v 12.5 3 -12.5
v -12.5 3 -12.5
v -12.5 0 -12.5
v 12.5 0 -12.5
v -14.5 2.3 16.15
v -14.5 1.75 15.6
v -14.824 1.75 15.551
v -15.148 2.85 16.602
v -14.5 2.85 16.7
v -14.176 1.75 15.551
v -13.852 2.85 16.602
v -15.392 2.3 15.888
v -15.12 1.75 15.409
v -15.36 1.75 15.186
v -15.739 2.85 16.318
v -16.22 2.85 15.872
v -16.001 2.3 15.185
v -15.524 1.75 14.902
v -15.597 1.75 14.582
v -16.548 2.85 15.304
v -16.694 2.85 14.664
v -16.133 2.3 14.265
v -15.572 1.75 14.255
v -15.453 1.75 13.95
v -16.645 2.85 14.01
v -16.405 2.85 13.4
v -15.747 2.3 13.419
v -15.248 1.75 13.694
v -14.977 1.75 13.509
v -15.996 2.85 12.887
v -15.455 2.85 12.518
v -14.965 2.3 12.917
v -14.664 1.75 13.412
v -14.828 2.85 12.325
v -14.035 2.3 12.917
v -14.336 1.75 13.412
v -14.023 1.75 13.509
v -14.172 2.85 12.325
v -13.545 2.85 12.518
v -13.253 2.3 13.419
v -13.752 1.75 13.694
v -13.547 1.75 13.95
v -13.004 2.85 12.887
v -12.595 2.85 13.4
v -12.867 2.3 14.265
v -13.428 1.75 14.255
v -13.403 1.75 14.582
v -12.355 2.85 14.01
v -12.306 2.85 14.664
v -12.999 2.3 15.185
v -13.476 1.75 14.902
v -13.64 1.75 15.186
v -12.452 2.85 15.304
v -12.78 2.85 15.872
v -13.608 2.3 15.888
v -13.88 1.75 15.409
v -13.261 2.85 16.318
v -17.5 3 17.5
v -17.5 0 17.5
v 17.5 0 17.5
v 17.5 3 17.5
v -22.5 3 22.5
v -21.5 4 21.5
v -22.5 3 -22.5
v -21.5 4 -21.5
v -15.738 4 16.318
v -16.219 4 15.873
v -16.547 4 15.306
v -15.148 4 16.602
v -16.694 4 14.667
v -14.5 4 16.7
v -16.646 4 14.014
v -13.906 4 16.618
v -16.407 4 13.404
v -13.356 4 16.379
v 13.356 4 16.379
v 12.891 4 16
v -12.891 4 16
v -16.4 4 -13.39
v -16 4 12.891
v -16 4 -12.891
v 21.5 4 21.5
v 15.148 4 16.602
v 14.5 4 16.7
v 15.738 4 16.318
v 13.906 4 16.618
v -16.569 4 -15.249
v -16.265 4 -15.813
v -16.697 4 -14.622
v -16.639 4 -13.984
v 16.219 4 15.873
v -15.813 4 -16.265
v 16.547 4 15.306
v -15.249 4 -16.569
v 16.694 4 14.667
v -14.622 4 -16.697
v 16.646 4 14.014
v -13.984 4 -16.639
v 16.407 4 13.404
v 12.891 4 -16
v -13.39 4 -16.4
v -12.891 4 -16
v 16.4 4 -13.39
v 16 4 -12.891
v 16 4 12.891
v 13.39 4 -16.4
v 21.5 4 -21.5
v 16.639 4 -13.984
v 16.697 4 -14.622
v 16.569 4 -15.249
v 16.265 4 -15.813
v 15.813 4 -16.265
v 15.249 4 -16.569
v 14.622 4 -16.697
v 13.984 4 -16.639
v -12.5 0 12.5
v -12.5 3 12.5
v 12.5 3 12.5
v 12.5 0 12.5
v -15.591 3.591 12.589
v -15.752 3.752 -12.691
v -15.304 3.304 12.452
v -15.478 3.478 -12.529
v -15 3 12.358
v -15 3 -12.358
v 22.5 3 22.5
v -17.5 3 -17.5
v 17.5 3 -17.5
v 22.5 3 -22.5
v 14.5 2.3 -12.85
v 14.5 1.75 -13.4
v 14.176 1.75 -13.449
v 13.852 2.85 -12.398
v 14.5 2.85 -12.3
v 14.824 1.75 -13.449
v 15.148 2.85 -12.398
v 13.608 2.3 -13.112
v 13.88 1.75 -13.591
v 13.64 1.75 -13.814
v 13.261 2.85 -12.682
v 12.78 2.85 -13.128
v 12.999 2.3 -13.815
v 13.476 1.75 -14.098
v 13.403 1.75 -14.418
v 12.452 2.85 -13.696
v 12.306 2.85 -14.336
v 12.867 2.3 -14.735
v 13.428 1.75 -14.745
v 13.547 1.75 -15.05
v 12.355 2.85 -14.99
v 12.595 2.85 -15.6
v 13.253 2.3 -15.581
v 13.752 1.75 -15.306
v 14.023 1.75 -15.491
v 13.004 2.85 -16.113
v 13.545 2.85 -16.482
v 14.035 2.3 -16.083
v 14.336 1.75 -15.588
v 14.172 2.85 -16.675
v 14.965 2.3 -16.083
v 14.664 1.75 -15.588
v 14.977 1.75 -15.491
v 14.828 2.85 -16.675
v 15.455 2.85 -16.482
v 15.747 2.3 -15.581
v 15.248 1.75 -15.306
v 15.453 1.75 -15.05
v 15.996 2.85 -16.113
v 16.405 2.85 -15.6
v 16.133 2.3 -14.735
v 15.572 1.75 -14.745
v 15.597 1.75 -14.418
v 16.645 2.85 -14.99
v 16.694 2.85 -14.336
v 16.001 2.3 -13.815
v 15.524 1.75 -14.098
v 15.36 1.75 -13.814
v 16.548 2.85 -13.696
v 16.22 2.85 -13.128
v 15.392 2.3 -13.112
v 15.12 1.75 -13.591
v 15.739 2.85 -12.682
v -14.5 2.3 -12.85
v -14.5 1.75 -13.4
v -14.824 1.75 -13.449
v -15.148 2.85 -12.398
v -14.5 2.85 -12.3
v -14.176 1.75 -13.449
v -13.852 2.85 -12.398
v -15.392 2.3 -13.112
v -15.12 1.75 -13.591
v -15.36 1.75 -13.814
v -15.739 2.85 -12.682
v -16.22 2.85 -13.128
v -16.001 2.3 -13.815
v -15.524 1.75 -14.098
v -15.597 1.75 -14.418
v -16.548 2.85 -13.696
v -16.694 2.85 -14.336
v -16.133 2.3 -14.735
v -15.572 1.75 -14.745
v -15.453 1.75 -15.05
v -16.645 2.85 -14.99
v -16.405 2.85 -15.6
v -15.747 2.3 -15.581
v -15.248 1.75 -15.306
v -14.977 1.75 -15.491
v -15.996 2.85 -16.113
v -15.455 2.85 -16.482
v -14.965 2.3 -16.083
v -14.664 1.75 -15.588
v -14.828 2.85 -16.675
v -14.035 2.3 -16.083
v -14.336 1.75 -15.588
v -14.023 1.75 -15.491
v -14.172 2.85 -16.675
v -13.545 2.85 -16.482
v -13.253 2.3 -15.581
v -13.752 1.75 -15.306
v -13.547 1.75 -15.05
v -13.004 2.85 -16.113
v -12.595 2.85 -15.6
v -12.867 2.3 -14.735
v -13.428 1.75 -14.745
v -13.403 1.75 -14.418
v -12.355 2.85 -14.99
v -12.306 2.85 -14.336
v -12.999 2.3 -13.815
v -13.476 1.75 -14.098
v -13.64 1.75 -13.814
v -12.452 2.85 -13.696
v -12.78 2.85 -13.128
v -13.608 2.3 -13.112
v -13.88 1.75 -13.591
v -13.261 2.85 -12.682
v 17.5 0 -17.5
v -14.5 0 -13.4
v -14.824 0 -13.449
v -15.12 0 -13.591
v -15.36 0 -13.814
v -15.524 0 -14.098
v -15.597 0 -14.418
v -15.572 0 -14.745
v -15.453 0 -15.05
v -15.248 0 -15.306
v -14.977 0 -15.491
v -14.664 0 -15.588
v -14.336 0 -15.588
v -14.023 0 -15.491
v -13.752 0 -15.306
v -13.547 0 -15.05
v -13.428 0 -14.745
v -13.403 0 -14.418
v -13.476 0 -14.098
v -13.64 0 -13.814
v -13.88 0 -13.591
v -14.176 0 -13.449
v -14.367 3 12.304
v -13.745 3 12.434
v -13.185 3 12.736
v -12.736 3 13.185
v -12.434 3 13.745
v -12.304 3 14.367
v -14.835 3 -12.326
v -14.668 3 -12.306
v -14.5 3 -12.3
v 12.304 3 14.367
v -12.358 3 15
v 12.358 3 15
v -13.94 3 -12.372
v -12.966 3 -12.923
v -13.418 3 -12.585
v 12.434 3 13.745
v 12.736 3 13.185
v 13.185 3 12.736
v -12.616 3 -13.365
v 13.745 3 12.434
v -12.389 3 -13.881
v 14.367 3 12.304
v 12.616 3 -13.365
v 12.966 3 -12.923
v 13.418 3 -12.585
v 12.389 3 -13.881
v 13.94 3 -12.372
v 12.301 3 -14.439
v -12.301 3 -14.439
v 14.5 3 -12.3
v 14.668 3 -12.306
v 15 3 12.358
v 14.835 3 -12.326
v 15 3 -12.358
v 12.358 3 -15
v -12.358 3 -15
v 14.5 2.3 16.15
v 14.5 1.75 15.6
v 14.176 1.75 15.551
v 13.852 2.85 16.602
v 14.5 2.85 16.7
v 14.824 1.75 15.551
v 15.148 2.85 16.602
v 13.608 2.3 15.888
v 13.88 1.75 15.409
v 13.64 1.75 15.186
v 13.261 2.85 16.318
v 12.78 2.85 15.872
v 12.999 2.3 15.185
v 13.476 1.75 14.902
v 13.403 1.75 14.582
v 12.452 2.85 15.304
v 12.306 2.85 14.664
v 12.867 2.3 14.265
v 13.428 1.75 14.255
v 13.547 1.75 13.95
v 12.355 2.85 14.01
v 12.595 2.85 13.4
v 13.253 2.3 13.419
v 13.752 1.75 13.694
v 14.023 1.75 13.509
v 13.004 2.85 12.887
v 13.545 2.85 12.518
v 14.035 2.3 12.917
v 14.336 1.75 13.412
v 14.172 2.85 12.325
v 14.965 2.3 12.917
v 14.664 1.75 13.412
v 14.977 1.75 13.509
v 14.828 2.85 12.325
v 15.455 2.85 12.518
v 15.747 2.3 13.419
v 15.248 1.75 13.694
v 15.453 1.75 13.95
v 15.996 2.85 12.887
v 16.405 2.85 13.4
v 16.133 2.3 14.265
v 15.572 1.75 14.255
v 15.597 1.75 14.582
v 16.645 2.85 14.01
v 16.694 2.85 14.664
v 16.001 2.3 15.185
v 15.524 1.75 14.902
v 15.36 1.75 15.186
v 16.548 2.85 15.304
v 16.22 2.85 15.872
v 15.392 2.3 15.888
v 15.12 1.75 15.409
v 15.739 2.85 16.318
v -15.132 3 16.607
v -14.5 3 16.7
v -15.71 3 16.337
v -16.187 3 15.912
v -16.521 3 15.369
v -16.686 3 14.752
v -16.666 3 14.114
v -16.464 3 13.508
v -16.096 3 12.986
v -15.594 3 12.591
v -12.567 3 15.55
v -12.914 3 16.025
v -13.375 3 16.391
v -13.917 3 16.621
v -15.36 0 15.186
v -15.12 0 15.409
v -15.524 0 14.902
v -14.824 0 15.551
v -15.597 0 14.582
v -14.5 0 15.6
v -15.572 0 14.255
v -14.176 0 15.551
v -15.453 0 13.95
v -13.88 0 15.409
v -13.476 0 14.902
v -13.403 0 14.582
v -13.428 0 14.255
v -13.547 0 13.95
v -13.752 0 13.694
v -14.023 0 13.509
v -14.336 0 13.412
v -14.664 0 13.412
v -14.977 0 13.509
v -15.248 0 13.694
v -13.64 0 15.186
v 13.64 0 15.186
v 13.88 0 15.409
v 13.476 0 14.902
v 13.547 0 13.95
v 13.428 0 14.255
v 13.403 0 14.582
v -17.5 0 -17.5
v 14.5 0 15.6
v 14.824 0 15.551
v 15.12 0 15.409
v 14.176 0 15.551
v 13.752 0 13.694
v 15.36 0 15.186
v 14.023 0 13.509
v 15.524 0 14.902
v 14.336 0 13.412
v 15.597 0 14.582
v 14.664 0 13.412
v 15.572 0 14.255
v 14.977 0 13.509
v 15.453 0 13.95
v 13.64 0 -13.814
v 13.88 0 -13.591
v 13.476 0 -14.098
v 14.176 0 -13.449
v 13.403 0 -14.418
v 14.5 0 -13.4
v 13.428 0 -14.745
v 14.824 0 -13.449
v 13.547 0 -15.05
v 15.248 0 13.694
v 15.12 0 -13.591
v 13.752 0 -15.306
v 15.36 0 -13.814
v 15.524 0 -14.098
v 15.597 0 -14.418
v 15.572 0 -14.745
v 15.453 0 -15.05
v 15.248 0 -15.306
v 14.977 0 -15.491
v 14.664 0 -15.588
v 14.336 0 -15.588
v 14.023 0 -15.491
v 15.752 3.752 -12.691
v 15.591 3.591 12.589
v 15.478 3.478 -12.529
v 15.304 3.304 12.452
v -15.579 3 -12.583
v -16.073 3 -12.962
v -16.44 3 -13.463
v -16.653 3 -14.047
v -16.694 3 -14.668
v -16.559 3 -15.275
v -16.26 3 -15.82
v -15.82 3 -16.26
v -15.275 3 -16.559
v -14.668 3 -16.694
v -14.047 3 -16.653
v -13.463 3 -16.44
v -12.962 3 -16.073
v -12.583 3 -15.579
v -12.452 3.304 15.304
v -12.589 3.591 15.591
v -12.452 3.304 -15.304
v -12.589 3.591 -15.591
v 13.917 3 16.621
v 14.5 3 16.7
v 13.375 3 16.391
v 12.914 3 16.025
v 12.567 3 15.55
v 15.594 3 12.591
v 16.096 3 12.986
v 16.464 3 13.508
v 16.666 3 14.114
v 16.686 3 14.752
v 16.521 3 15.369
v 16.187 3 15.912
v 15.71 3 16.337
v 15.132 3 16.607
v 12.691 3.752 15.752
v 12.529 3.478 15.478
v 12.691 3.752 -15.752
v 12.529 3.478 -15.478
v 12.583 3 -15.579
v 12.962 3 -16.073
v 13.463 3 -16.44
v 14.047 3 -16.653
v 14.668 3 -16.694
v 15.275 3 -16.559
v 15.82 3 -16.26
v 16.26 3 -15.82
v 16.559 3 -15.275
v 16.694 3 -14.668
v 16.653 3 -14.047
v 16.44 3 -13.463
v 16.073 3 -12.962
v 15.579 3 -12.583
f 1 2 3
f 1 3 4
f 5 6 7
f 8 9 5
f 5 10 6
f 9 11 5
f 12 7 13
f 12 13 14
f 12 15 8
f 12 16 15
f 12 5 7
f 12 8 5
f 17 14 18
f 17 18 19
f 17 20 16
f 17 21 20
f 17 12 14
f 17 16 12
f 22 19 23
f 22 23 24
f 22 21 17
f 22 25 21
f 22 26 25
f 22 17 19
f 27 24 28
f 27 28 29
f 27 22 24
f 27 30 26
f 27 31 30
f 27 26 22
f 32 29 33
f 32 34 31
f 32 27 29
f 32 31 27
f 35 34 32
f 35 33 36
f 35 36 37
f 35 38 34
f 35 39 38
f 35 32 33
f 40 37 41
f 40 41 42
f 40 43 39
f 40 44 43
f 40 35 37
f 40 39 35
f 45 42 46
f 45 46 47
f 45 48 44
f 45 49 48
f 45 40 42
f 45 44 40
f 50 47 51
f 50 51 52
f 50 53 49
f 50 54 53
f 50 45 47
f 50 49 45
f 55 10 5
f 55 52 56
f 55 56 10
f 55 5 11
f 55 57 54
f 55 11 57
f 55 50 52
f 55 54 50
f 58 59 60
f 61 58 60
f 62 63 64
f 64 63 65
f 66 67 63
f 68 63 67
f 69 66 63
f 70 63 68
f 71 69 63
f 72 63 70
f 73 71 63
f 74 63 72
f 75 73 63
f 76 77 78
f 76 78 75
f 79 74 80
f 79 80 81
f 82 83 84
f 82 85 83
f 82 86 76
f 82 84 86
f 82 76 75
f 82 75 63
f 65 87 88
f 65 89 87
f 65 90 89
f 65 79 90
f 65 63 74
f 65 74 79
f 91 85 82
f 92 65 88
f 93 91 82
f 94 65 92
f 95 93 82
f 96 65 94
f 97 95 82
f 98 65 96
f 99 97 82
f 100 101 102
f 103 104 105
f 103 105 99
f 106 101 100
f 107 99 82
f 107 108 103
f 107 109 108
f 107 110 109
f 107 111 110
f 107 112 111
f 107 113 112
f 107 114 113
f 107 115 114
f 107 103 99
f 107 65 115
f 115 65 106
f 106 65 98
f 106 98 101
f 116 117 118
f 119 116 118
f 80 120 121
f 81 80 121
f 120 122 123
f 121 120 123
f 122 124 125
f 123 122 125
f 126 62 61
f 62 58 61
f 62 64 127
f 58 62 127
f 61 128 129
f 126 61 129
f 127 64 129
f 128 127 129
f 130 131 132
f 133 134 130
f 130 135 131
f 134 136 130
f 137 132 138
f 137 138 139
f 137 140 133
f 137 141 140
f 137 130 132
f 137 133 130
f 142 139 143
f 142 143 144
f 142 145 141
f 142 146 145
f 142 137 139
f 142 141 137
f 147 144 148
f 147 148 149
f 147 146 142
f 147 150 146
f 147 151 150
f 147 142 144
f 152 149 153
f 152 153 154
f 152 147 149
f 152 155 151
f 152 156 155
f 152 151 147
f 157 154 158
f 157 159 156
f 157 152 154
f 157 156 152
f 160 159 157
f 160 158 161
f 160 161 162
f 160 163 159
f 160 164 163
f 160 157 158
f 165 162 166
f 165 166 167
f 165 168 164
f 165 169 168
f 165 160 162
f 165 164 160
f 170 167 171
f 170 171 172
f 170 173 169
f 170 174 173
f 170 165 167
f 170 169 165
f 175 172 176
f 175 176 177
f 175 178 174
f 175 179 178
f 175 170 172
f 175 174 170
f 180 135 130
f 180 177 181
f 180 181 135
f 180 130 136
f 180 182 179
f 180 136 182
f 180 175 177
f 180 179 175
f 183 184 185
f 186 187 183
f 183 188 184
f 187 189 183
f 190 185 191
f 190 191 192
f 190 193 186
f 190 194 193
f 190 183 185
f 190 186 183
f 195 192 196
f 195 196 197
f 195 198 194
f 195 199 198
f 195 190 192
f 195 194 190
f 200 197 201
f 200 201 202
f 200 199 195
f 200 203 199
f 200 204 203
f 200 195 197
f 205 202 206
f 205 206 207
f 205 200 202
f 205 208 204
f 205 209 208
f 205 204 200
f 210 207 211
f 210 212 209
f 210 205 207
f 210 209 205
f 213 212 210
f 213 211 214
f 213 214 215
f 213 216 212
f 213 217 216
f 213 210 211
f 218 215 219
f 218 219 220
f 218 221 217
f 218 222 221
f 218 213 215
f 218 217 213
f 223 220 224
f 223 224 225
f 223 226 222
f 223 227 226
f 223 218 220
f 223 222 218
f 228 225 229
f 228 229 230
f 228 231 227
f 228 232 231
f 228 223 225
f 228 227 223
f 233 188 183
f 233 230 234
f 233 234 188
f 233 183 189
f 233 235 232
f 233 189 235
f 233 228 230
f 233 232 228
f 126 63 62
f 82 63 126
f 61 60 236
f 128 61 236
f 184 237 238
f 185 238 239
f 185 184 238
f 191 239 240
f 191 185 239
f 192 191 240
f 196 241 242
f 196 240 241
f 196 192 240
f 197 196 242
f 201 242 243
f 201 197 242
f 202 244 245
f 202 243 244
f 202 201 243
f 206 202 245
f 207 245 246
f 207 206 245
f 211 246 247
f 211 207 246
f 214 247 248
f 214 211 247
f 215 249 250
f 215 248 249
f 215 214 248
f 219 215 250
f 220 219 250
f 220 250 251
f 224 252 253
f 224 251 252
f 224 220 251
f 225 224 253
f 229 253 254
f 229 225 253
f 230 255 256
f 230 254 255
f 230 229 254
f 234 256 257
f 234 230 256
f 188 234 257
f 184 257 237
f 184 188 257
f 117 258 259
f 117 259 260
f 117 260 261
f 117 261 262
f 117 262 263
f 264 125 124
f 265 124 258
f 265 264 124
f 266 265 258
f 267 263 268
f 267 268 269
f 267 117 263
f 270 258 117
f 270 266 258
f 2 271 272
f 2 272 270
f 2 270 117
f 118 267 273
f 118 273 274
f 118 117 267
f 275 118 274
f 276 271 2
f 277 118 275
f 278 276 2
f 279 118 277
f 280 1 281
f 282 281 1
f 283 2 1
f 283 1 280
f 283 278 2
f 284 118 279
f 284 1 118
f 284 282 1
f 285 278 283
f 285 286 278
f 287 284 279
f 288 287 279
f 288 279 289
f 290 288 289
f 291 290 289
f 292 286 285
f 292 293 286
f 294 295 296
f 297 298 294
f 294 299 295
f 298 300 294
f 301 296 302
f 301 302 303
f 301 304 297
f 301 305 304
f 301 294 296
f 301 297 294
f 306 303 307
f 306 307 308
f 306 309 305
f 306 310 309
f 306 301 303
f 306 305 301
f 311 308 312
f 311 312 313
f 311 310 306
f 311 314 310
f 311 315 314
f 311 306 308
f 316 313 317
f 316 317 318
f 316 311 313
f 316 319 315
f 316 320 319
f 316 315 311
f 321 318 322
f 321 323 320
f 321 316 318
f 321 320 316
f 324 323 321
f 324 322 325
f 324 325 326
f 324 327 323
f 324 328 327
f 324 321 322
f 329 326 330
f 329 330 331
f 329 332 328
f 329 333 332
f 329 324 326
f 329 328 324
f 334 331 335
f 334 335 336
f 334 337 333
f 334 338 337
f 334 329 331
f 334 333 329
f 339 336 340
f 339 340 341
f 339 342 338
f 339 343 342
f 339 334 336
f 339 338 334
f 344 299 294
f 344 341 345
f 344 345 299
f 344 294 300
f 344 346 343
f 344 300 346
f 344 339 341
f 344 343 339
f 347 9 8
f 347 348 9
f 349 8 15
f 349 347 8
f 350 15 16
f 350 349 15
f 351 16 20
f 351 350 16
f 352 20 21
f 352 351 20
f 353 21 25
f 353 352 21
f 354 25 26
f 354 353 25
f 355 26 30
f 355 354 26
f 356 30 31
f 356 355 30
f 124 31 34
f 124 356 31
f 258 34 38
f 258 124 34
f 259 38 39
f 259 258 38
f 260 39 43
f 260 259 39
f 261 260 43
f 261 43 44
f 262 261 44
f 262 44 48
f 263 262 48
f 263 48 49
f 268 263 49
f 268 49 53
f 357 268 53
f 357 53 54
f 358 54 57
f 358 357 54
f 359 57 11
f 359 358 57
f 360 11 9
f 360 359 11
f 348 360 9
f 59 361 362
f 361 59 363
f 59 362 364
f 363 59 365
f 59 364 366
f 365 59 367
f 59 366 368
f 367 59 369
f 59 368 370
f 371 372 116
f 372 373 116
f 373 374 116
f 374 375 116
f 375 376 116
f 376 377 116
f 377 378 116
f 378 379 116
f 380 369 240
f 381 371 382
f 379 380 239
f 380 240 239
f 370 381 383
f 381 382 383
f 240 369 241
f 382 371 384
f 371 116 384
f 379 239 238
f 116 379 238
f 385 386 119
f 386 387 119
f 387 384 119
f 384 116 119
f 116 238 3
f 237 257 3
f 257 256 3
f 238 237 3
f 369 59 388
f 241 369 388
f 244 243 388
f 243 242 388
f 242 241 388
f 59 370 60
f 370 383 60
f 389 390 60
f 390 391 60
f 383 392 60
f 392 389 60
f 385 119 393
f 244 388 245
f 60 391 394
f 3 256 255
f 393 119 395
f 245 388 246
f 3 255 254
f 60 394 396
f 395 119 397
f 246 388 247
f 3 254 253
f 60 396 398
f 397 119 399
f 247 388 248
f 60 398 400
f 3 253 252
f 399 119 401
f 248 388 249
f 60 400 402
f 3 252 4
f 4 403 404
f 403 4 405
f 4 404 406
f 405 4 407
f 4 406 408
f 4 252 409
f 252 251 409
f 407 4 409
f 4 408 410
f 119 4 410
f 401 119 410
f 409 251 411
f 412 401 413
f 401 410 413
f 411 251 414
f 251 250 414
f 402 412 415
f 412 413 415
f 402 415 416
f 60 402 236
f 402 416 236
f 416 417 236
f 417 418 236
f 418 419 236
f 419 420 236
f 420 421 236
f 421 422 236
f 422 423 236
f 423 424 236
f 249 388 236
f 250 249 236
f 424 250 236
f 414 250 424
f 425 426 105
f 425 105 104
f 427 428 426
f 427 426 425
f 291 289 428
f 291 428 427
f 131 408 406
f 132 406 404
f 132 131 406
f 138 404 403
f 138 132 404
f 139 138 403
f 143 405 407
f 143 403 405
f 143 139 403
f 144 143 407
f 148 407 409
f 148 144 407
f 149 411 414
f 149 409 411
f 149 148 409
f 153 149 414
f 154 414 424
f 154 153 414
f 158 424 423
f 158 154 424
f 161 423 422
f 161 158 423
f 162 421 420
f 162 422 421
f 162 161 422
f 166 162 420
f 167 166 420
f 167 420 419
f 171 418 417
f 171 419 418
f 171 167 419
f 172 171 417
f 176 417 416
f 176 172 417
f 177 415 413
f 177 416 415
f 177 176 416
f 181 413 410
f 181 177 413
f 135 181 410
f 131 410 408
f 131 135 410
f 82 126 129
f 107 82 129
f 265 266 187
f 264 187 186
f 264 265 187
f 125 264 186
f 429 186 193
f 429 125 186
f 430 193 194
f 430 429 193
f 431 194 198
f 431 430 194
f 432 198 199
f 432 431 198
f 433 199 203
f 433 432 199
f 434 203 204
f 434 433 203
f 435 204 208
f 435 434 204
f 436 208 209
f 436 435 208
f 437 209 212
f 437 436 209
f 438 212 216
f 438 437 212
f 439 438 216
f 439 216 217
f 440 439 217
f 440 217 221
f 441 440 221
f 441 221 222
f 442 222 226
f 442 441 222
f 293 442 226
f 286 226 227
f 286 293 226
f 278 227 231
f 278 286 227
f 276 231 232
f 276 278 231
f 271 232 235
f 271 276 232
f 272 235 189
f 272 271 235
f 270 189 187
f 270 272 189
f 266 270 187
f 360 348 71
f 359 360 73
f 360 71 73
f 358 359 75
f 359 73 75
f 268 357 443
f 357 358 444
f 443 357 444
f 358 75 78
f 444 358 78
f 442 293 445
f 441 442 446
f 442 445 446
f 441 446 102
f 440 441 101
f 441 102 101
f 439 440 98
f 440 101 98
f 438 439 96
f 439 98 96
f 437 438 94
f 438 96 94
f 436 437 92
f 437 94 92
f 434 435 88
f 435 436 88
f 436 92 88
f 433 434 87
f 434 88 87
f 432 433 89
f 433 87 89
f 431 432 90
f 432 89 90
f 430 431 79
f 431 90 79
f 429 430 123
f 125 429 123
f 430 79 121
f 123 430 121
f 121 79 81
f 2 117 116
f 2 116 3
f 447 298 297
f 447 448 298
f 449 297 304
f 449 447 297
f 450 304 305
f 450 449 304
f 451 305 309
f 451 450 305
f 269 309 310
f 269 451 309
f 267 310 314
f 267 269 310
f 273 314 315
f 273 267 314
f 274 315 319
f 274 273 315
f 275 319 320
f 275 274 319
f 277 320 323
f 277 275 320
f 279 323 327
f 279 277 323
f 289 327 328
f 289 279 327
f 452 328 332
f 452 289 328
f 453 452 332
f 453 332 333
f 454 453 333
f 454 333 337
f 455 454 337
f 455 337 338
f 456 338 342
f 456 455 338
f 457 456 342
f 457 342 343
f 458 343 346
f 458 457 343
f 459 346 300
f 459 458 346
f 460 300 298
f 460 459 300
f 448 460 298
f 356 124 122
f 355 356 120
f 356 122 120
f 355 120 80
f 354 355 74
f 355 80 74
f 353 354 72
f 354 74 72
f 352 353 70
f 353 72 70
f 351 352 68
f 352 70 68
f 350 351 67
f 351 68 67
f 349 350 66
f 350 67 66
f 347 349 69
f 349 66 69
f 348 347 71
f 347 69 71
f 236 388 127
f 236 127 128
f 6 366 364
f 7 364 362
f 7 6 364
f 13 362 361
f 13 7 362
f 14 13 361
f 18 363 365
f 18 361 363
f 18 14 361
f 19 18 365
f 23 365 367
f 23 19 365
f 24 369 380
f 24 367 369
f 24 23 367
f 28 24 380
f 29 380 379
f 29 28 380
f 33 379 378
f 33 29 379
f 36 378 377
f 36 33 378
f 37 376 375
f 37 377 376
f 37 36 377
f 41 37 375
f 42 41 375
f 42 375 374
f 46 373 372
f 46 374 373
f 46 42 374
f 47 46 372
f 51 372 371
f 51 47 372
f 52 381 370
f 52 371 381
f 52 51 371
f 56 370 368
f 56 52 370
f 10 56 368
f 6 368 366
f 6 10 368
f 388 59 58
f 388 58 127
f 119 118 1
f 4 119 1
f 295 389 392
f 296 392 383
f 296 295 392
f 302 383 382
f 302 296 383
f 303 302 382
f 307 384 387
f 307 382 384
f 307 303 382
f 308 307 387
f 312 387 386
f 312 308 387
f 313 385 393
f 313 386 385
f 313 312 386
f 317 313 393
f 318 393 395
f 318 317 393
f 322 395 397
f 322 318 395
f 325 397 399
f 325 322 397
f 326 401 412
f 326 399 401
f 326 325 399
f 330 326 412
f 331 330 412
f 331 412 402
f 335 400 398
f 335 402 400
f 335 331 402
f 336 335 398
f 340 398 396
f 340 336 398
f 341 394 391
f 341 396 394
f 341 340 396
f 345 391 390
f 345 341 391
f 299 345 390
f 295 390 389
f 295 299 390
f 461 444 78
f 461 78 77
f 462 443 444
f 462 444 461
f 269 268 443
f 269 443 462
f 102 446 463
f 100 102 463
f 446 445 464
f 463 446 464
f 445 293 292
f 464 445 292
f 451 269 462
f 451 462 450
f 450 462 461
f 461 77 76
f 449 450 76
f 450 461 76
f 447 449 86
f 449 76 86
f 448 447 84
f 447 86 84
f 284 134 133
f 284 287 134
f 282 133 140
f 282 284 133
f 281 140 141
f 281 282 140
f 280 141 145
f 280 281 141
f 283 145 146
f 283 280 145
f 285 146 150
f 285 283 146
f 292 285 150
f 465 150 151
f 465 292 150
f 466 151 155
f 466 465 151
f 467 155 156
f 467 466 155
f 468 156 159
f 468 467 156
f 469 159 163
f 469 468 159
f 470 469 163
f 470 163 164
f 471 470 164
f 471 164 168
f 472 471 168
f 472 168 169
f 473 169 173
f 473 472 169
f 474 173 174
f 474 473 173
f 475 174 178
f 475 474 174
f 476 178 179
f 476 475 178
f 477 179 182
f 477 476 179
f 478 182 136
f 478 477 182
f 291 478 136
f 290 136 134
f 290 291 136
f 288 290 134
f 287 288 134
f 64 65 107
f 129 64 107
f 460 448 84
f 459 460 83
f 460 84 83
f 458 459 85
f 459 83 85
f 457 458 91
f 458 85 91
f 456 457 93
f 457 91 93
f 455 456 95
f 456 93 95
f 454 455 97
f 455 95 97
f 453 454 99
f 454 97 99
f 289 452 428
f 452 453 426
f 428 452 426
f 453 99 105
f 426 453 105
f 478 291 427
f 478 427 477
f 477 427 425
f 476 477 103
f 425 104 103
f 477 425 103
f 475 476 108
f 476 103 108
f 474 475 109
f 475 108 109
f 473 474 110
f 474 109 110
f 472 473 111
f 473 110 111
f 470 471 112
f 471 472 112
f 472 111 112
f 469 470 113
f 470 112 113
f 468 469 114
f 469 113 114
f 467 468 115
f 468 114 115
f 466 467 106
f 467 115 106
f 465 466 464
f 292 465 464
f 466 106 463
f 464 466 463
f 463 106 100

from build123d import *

# Parameters (mm, degrees)
SKETCH1_W                                      = 35
SKETCH1_H                                      = 35
BOSS_EXTRUDE1_DEPTH                            = 3
SKETCH3_W                                      = 25
SKETCH3_H                                      = 25
CUT_EXTRUDE2_DEPTH                             = 25.929901725
SKETCH4_W                                      = 45
SKETCH4_H                                      = 45
SKETCH4_W_2                                    = 30
SKETCH4_H_2                                    = 30
BOSS_EXTRUDE2_DEPTH                            = 1
CHAMFER2_SIZE                                  = 1
CSK_FOR_M2_FLAT_HEAD_MACHINE_SCREW1_AT_2_COUNT = 2
CSK_FOR_M2_FLAT_HEAD_MACHINE_SCREW1_AT_2_PITCH = 29
CSK_FOR_M2_FLAT_HEAD_MACHINE_SCREW1_AT_3_COUNT = 2
CSK_FOR_M2_FLAT_HEAD_MACHINE_SCREW1_AT_3_PITCH = 41.012193309
CSK_FOR_M2_FLAT_HEAD_MACHINE_SCREW1_AT_4_COUNT = 2
CSK_FOR_M2_FLAT_HEAD_MACHINE_SCREW1_AT_4_PITCH = 29
CSK_FOR_M2_FLAT_HEAD_MACHINE_SCREW1_AT_5_COUNT = 2
CSK_FOR_M2_FLAT_HEAD_MACHINE_SCREW1_AT_5_PITCH = 20.506096654
CUT_EXTRUDE3_START                             = 10
SKETCH7_R                                      = 2.2
CUT_EXTRUDE3_DEPTH                             = 10


with BuildPart() as part:
    # Sketch1 → Boss-Extrude1 (new body)
    with BuildSketch(Plane(origin=(0, 0, 0), x_dir=(1, 0, 0), z_dir=(0, 1, 0))):
        Rectangle(SKETCH1_W, SKETCH1_H)
    extrude(amount=BOSS_EXTRUDE1_DEPTH)

    # Sketch3 → Cut-Extrude2 (cut, through all)
    with BuildSketch(Plane(origin=(0, 3, 0), x_dir=(1, 0, 0), z_dir=(0, 1, 0))):
        Rectangle(SKETCH3_W, SKETCH3_H)
    extrude(amount=-CUT_EXTRUDE2_DEPTH, mode=Mode.SUBTRACT)

    # Sketch4 → Boss-Extrude2 (add)
    with BuildSketch(Plane(origin=(0, 3, 0), x_dir=(1, 0, 0), z_dir=(0, 1, 0))):
        Rectangle(SKETCH4_W, SKETCH4_H)
        Rectangle(SKETCH4_W_2, SKETCH4_H_2, mode=Mode.SUBTRACT)
    extrude(amount=BOSS_EXTRUDE2_DEPTH)

    # Chamfer2
    chamfer2_edges = [part.edges().sort_by_distance(p)[0] for p in [
        (0, 4, -15),
        (-15, 4, 0),
        (0, 4, 15),
        (15, 4, 0),
        (0, 4, 22.5),
        (-22.5, 4, 0),
        (0, 4, -22.5),
        (22.5, 4, 0),
    ]]
    chamfer(chamfer2_edges, length=CHAMFER2_SIZE - 0.0001)  # a hair under: the kernel refuses the full size

    # Sketch5 → CSK for M2 Flat Head Machine Screw1 (revolve, cut)
    with BuildSketch(Plane(origin=(14.5, 3, -14.5), x_dir=(0, 0, 1), z_dir=(1, 0, 0))):
        Polygon((0, 0), (0, 20.660946681), (1.1, 20), (1.1, 1.25), (2.2, 0.15), (2.2, 0), align=None)
    csk_for_m2_flat_head_machine_screw1 = revolve(axis=Axis((14.5, 9.35, -14.5), (0, -1, 0)), mode=Mode.SUBTRACT)

    # CSK for M2 Flat Head Machine Screw1 at 2: CSK for M2 Flat Head Machine Screw1 ×2
    with Locations(*[(0, 0, i * CSK_FOR_M2_FLAT_HEAD_MACHINE_SCREW1_AT_2_PITCH) for i in range(1, CSK_FOR_M2_FLAT_HEAD_MACHINE_SCREW1_AT_2_COUNT)]):
        add(csk_for_m2_flat_head_machine_screw1, mode=Mode.SUBTRACT)

    # CSK for M2 Flat Head Machine Screw1 at 3: CSK for M2 Flat Head Machine Screw1 ×2
    with Locations(*[Vector(-0.70710678118655, 0, 0.7071067811865451) * (i * CSK_FOR_M2_FLAT_HEAD_MACHINE_SCREW1_AT_3_PITCH) for i in range(1, CSK_FOR_M2_FLAT_HEAD_MACHINE_SCREW1_AT_3_COUNT)]):
        add(csk_for_m2_flat_head_machine_screw1, mode=Mode.SUBTRACT)

    # CSK for M2 Flat Head Machine Screw1 at 4: CSK for M2 Flat Head Machine Screw1 ×2
    with Locations(*[(-i * CSK_FOR_M2_FLAT_HEAD_MACHINE_SCREW1_AT_4_PITCH, 0, 0) for i in range(1, CSK_FOR_M2_FLAT_HEAD_MACHINE_SCREW1_AT_4_COUNT)]):
        add(csk_for_m2_flat_head_machine_screw1, mode=Mode.SUBTRACT)

    # CSK for M2 Flat Head Machine Screw1 at 5: CSK for M2 Flat Head Machine Screw1 ×2
    with Locations(*[Vector(-0.7071067811865493, 0, 0.7071067811865457) * (i * CSK_FOR_M2_FLAT_HEAD_MACHINE_SCREW1_AT_5_PITCH) for i in range(1, CSK_FOR_M2_FLAT_HEAD_MACHINE_SCREW1_AT_5_COUNT)]):
        add(csk_for_m2_flat_head_machine_screw1, mode=Mode.SUBTRACT)

    # Sketch7 → Cut-Extrude3 (cut)
    with BuildSketch(Plane(origin=(0, 3, 0), x_dir=(1, 0, 0), z_dir=(0, 1, 0)).offset(CUT_EXTRUDE3_START)):
        with Locations(Location((14.5, 14.5, 0), (0, 0, 270))):
            Circle(SKETCH7_R)
        with Locations(Location((14.5, -14.5, 0), (0, 0, 270))):
            Circle(SKETCH7_R)
        with Locations(Location((-14.5, -14.5, 0), (0, 0, 270))):
            Circle(SKETCH7_R)
        with Locations(Location((-14.5, 14.5, 0), (0, 0, 270))):
            Circle(SKETCH7_R)
    extrude(amount=-CUT_EXTRUDE3_DEPTH, mode=Mode.SUBTRACT)


solid = part.part
